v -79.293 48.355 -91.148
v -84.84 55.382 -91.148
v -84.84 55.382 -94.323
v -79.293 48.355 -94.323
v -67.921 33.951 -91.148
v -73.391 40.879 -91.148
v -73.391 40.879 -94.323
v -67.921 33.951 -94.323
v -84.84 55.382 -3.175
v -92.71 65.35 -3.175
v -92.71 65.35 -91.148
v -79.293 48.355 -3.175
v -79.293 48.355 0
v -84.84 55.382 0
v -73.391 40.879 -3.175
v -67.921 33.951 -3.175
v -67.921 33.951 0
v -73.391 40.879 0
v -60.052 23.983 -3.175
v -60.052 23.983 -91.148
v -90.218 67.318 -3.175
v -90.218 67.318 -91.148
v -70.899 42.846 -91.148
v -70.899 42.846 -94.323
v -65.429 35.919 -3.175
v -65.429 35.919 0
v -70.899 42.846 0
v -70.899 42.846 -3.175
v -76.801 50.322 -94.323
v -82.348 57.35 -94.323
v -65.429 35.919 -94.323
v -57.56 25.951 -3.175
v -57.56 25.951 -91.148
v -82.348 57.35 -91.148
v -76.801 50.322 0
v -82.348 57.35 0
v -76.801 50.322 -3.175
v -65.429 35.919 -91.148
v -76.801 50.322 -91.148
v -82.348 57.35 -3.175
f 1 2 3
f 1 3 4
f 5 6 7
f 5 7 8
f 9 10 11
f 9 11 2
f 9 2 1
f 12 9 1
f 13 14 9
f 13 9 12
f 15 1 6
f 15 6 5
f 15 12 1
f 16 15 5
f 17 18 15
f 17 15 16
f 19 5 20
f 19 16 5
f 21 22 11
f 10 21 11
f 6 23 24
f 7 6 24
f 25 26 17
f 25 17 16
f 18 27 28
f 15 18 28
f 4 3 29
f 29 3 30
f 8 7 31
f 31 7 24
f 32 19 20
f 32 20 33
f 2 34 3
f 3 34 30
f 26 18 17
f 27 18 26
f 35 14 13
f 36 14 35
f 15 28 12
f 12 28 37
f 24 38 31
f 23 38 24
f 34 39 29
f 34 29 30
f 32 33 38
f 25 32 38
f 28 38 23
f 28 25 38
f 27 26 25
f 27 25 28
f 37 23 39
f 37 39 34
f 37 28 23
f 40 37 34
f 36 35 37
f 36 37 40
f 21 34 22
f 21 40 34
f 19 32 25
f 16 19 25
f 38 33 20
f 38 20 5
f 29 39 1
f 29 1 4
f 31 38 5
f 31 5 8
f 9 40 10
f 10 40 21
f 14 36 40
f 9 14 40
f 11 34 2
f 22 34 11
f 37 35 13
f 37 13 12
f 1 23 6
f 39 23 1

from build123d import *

# Parameters (mm, degrees)
BOSS_EXTRUDE1_DEPTH = 94.322511
SKETCH2_W           = 3.175
SKETCH2_H           = 12.7
SKETCH2_H_2         = 9.525
CUT_EXTRUDE1_DEPTH  = 146.131101822


with BuildPart() as part:
    # Sketch1 → Boss-Extrude1 (new body)
    with BuildSketch(Plane.XY):
        Polygon((-57.559752251, 25.95051887), (-90.217961646, 67.317584104), (-92.709964426, 65.350213488), (-60.051755031, 23.983148254), align=None)
    extrude(amount=-BOSS_EXTRUDE1_DEPTH)

    # Sketch2 → Cut-Extrude1 (cut, through all)
    with BuildSketch(Plane(origin=(-22.838178642, -18.030141034, 0), x_dir=(0, 0, -1), z_dir=(0.7848827655333936, 0.6196442885790622, 0))):
        with Locations((92.735011379, 102.389456242)):
            Rectangle(SKETCH2_W, SKETCH2_H)
        with Locations((92.735011379, 82.323686752)):
            Rectangle(SKETCH2_W, SKETCH2_H_2)
        with Locations((92.735011379, 62.384686752)):
            Rectangle(SKETCH2_W, SKETCH2_H)
        with Locations((1.5875, 102.389456242)):
            Rectangle(SKETCH2_W, SKETCH2_H)
        with Locations((1.5875, 82.323686752)):
            Rectangle(SKETCH2_W, SKETCH2_H_2)
        with Locations((1.5875, 62.384686752)):
            Rectangle(SKETCH2_W, SKETCH2_H)
    extrude(amount=-CUT_EXTRUDE1_DEPTH, mode=Mode.SUBTRACT)


solid = part.part
